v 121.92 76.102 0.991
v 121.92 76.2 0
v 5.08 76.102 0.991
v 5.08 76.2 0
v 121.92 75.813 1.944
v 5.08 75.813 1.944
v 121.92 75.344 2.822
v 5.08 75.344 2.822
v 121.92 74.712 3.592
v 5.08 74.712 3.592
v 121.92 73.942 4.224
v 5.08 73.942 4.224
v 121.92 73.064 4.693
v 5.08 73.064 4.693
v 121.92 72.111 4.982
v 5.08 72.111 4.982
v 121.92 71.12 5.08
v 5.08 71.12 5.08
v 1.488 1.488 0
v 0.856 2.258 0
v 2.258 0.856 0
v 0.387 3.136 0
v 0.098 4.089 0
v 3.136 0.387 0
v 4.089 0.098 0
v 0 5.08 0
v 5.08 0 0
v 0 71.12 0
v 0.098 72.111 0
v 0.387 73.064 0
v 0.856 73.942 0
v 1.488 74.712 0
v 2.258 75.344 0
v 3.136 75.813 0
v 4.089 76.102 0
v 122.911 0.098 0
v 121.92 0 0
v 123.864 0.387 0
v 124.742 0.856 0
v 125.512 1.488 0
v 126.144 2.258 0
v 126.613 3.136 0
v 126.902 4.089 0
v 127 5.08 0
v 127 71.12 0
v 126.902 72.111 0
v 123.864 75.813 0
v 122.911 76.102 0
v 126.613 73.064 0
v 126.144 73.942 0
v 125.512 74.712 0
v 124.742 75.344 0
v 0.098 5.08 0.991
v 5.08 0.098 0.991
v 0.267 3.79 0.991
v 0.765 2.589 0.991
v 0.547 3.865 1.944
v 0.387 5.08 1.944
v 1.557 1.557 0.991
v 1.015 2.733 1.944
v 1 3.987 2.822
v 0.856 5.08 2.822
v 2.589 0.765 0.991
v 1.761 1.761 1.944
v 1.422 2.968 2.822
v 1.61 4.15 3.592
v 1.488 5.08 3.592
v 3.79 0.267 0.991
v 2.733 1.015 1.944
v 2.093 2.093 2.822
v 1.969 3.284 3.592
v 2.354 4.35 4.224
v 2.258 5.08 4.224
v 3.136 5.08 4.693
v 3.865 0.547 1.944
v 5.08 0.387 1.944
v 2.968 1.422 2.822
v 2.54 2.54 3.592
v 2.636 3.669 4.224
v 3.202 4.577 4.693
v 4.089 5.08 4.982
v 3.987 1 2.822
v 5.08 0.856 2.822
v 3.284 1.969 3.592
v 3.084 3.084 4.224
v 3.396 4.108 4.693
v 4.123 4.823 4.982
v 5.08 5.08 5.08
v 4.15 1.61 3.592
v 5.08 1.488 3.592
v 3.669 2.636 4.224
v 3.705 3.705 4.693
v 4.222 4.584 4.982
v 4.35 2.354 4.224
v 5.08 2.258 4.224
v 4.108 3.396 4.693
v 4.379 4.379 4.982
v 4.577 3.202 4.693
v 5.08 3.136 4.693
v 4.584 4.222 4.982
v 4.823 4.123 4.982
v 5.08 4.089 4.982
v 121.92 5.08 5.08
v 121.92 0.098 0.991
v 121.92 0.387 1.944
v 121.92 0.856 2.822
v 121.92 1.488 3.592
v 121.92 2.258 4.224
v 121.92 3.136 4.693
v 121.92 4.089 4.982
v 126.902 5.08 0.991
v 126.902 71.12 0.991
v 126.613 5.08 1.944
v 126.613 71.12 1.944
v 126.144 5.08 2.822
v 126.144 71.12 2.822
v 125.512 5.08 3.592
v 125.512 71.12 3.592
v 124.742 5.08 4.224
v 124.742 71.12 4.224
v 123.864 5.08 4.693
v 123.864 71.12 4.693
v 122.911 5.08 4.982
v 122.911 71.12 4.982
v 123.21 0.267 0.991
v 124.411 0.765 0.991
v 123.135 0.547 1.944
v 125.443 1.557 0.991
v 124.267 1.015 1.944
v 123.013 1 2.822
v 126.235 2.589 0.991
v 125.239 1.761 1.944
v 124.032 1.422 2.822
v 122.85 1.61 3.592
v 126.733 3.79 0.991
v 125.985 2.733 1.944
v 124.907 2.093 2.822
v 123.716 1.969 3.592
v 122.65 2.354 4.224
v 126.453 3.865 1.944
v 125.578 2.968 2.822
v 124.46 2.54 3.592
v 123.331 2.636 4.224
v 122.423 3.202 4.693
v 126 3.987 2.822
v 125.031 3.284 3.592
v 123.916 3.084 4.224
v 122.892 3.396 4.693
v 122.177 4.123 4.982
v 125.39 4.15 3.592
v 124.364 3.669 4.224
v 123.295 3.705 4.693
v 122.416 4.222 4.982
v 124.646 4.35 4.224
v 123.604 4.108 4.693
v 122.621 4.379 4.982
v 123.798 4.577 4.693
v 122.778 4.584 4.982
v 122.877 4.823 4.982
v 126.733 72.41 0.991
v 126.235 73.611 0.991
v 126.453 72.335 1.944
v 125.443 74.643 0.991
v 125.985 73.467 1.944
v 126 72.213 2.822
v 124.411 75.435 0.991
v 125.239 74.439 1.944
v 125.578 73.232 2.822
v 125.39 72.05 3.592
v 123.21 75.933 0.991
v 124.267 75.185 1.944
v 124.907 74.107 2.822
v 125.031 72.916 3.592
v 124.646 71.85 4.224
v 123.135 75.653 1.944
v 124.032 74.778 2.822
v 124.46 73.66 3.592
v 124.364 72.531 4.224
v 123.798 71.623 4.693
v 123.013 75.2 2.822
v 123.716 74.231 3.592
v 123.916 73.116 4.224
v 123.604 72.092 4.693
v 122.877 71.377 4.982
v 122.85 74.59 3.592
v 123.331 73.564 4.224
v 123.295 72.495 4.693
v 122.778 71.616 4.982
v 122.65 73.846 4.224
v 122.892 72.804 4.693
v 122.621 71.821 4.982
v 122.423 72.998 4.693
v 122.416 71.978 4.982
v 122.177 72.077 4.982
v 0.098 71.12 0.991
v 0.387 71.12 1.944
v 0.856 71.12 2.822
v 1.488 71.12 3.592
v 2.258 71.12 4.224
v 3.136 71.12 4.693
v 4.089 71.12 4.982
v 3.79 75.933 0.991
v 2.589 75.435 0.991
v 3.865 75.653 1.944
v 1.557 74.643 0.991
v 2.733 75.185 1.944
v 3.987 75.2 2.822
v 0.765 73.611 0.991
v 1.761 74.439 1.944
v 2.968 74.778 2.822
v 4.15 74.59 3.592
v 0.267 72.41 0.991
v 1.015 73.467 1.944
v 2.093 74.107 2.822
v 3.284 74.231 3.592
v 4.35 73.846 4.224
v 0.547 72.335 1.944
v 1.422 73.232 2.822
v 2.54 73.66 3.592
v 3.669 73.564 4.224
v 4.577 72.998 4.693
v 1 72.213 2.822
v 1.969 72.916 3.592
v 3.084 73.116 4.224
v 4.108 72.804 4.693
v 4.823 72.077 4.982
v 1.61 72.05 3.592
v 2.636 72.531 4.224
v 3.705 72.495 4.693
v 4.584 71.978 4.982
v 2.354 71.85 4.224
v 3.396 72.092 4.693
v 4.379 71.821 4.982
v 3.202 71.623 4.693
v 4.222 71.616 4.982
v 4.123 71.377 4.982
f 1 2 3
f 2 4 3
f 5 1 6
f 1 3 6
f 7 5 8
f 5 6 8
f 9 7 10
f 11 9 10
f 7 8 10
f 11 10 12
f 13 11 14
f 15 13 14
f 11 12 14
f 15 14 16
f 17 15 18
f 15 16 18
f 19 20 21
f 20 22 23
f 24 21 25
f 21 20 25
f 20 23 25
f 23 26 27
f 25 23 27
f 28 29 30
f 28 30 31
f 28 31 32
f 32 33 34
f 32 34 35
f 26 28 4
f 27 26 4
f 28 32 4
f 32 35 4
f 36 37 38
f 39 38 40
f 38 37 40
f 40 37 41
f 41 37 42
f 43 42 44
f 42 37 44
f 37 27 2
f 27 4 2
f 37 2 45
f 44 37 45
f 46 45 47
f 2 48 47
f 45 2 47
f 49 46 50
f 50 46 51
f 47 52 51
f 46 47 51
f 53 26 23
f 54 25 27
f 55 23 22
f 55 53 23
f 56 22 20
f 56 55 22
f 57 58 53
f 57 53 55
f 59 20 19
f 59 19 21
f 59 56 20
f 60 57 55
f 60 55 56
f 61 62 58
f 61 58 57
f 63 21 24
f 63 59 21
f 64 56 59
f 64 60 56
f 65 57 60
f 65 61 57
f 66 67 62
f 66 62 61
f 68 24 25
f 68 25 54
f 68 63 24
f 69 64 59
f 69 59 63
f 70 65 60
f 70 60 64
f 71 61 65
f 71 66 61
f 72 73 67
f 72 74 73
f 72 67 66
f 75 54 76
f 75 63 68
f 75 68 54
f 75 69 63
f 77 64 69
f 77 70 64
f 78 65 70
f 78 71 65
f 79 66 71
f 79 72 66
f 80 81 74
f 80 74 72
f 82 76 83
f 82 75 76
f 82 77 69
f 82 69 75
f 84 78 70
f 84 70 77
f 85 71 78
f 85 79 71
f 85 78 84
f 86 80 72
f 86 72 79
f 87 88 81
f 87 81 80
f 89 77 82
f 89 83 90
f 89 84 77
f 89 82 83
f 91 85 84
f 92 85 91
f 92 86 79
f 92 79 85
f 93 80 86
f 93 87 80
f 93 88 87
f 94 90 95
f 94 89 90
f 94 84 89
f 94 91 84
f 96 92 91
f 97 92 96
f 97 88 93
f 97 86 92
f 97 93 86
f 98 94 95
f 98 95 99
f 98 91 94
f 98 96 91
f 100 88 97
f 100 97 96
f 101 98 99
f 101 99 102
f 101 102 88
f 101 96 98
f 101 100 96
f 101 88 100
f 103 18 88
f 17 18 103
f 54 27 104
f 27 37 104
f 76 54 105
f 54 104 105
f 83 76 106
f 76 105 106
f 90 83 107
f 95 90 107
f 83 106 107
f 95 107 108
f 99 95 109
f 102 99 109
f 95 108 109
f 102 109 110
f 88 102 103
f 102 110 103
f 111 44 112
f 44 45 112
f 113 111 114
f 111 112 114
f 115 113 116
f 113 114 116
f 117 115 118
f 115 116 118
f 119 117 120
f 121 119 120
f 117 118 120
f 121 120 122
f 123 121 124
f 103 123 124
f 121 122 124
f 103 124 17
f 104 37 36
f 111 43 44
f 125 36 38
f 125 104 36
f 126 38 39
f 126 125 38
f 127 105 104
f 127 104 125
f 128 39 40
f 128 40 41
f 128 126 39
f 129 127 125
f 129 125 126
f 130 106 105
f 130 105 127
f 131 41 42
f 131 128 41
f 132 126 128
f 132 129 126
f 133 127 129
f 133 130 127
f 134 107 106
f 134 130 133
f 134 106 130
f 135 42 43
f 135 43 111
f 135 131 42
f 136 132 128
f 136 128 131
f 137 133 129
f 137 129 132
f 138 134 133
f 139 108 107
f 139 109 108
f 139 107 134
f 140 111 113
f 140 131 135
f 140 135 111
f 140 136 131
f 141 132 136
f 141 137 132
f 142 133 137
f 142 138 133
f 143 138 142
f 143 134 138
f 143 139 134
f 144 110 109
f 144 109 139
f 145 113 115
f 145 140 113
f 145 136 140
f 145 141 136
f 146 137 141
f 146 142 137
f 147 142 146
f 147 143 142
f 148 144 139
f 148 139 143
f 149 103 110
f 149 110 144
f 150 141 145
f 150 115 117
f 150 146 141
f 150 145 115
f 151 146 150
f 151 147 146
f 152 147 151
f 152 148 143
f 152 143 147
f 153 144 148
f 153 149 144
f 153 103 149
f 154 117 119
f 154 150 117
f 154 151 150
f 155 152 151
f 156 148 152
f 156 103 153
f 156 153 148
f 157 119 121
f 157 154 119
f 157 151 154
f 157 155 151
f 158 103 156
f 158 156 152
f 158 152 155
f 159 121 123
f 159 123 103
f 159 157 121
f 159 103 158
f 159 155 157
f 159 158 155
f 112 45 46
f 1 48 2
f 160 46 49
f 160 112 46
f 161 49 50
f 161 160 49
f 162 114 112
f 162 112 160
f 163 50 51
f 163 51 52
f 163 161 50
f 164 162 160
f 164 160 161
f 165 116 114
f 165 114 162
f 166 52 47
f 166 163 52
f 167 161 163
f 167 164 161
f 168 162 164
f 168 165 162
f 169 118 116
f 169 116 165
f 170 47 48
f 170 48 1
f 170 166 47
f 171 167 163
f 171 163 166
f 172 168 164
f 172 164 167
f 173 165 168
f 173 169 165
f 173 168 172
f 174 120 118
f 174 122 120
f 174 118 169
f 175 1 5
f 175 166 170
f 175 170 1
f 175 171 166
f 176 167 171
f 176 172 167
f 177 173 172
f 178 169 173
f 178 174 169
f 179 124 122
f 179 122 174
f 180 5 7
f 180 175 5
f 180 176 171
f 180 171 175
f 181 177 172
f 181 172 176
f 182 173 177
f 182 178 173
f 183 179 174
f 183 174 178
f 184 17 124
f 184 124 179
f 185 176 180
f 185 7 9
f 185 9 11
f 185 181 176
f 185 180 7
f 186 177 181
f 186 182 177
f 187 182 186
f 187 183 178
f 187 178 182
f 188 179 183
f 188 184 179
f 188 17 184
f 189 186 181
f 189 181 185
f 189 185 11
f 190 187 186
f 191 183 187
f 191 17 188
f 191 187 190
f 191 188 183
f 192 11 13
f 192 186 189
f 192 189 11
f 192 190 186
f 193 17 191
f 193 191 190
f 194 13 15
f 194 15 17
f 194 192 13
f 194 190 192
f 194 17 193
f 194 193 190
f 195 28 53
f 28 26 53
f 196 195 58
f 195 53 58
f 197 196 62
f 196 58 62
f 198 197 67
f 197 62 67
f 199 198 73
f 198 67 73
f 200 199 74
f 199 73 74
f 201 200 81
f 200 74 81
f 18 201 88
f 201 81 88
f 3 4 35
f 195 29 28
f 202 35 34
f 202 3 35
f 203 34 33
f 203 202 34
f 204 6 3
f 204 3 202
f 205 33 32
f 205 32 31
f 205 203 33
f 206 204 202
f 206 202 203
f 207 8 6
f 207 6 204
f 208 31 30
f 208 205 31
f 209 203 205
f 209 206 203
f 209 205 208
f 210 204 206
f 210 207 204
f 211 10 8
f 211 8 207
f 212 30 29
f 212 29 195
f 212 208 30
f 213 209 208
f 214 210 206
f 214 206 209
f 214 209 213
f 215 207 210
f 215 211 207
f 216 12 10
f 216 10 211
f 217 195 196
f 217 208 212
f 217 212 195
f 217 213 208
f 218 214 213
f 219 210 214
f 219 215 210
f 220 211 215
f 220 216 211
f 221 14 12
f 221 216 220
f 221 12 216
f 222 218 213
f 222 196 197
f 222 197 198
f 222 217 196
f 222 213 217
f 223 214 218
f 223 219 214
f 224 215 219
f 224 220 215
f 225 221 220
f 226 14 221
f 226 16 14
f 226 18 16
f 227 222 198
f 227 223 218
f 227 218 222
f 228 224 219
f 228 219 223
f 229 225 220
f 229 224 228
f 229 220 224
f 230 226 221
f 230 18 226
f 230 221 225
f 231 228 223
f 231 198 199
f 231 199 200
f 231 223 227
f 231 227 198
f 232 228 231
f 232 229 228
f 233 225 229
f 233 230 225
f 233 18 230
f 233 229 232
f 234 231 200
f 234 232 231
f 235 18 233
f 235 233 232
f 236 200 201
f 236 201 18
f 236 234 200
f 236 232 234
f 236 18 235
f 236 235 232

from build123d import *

# Parameters (mm, degrees)
F1_DEPTH = 5.08
F2_R     = 5.07999


# Not quite as in the source:
# - a fillet or chamfer is up to 0.001 mm smaller than in the source, because OpenCascade refuses the exact size


with BuildPart() as f1:
    # F0 (on Top) → F1 (new body)
    with BuildSketch(Plane.XY):
        with BuildLine():
            Line((121.92, 76.2), (5.08, 76.2))
            ThreePointArc((5.08, 76.2), (1.4878975516, 74.7121024484), (0, 71.12))
            Line((0, 71.12), (0, 5.08))
            ThreePointArc((0, 5.08), (1.4878975516, 1.4878975516), (5.08, 0))
            Line((5.08, 0), (121.92, 0))
            ThreePointArc((121.92, 0), (125.5121024484, 1.4878975516), (127, 5.08))
            Line((127, 5.08), (127, 71.12))
            ThreePointArc((127, 71.12), (125.5121024484, 74.7121024484), (121.92, 76.2))
        make_face()
    extrude(amount=F1_DEPTH)

    # F2 (radius 5.08 in the source; OpenCascade refuses exactly that, so slightly less here)
    f2_edges = [f1.edges().sort_by_distance(p)[0] for p in [
        (63.5, 76.2, 5.08),
        (1.487898, 74.712102, 5.08),
        (0, 38.1, 5.08),
        (1.487898, 1.487898, 5.08),
        (63.5, 0, 5.08),
        (125.512102, 1.487898, 5.08),
        (127, 38.1, 5.08),
        (125.512102, 74.712102, 5.08),
    ]]
    fillet(f2_edges, radius=F2_R)


solid = f1.part
